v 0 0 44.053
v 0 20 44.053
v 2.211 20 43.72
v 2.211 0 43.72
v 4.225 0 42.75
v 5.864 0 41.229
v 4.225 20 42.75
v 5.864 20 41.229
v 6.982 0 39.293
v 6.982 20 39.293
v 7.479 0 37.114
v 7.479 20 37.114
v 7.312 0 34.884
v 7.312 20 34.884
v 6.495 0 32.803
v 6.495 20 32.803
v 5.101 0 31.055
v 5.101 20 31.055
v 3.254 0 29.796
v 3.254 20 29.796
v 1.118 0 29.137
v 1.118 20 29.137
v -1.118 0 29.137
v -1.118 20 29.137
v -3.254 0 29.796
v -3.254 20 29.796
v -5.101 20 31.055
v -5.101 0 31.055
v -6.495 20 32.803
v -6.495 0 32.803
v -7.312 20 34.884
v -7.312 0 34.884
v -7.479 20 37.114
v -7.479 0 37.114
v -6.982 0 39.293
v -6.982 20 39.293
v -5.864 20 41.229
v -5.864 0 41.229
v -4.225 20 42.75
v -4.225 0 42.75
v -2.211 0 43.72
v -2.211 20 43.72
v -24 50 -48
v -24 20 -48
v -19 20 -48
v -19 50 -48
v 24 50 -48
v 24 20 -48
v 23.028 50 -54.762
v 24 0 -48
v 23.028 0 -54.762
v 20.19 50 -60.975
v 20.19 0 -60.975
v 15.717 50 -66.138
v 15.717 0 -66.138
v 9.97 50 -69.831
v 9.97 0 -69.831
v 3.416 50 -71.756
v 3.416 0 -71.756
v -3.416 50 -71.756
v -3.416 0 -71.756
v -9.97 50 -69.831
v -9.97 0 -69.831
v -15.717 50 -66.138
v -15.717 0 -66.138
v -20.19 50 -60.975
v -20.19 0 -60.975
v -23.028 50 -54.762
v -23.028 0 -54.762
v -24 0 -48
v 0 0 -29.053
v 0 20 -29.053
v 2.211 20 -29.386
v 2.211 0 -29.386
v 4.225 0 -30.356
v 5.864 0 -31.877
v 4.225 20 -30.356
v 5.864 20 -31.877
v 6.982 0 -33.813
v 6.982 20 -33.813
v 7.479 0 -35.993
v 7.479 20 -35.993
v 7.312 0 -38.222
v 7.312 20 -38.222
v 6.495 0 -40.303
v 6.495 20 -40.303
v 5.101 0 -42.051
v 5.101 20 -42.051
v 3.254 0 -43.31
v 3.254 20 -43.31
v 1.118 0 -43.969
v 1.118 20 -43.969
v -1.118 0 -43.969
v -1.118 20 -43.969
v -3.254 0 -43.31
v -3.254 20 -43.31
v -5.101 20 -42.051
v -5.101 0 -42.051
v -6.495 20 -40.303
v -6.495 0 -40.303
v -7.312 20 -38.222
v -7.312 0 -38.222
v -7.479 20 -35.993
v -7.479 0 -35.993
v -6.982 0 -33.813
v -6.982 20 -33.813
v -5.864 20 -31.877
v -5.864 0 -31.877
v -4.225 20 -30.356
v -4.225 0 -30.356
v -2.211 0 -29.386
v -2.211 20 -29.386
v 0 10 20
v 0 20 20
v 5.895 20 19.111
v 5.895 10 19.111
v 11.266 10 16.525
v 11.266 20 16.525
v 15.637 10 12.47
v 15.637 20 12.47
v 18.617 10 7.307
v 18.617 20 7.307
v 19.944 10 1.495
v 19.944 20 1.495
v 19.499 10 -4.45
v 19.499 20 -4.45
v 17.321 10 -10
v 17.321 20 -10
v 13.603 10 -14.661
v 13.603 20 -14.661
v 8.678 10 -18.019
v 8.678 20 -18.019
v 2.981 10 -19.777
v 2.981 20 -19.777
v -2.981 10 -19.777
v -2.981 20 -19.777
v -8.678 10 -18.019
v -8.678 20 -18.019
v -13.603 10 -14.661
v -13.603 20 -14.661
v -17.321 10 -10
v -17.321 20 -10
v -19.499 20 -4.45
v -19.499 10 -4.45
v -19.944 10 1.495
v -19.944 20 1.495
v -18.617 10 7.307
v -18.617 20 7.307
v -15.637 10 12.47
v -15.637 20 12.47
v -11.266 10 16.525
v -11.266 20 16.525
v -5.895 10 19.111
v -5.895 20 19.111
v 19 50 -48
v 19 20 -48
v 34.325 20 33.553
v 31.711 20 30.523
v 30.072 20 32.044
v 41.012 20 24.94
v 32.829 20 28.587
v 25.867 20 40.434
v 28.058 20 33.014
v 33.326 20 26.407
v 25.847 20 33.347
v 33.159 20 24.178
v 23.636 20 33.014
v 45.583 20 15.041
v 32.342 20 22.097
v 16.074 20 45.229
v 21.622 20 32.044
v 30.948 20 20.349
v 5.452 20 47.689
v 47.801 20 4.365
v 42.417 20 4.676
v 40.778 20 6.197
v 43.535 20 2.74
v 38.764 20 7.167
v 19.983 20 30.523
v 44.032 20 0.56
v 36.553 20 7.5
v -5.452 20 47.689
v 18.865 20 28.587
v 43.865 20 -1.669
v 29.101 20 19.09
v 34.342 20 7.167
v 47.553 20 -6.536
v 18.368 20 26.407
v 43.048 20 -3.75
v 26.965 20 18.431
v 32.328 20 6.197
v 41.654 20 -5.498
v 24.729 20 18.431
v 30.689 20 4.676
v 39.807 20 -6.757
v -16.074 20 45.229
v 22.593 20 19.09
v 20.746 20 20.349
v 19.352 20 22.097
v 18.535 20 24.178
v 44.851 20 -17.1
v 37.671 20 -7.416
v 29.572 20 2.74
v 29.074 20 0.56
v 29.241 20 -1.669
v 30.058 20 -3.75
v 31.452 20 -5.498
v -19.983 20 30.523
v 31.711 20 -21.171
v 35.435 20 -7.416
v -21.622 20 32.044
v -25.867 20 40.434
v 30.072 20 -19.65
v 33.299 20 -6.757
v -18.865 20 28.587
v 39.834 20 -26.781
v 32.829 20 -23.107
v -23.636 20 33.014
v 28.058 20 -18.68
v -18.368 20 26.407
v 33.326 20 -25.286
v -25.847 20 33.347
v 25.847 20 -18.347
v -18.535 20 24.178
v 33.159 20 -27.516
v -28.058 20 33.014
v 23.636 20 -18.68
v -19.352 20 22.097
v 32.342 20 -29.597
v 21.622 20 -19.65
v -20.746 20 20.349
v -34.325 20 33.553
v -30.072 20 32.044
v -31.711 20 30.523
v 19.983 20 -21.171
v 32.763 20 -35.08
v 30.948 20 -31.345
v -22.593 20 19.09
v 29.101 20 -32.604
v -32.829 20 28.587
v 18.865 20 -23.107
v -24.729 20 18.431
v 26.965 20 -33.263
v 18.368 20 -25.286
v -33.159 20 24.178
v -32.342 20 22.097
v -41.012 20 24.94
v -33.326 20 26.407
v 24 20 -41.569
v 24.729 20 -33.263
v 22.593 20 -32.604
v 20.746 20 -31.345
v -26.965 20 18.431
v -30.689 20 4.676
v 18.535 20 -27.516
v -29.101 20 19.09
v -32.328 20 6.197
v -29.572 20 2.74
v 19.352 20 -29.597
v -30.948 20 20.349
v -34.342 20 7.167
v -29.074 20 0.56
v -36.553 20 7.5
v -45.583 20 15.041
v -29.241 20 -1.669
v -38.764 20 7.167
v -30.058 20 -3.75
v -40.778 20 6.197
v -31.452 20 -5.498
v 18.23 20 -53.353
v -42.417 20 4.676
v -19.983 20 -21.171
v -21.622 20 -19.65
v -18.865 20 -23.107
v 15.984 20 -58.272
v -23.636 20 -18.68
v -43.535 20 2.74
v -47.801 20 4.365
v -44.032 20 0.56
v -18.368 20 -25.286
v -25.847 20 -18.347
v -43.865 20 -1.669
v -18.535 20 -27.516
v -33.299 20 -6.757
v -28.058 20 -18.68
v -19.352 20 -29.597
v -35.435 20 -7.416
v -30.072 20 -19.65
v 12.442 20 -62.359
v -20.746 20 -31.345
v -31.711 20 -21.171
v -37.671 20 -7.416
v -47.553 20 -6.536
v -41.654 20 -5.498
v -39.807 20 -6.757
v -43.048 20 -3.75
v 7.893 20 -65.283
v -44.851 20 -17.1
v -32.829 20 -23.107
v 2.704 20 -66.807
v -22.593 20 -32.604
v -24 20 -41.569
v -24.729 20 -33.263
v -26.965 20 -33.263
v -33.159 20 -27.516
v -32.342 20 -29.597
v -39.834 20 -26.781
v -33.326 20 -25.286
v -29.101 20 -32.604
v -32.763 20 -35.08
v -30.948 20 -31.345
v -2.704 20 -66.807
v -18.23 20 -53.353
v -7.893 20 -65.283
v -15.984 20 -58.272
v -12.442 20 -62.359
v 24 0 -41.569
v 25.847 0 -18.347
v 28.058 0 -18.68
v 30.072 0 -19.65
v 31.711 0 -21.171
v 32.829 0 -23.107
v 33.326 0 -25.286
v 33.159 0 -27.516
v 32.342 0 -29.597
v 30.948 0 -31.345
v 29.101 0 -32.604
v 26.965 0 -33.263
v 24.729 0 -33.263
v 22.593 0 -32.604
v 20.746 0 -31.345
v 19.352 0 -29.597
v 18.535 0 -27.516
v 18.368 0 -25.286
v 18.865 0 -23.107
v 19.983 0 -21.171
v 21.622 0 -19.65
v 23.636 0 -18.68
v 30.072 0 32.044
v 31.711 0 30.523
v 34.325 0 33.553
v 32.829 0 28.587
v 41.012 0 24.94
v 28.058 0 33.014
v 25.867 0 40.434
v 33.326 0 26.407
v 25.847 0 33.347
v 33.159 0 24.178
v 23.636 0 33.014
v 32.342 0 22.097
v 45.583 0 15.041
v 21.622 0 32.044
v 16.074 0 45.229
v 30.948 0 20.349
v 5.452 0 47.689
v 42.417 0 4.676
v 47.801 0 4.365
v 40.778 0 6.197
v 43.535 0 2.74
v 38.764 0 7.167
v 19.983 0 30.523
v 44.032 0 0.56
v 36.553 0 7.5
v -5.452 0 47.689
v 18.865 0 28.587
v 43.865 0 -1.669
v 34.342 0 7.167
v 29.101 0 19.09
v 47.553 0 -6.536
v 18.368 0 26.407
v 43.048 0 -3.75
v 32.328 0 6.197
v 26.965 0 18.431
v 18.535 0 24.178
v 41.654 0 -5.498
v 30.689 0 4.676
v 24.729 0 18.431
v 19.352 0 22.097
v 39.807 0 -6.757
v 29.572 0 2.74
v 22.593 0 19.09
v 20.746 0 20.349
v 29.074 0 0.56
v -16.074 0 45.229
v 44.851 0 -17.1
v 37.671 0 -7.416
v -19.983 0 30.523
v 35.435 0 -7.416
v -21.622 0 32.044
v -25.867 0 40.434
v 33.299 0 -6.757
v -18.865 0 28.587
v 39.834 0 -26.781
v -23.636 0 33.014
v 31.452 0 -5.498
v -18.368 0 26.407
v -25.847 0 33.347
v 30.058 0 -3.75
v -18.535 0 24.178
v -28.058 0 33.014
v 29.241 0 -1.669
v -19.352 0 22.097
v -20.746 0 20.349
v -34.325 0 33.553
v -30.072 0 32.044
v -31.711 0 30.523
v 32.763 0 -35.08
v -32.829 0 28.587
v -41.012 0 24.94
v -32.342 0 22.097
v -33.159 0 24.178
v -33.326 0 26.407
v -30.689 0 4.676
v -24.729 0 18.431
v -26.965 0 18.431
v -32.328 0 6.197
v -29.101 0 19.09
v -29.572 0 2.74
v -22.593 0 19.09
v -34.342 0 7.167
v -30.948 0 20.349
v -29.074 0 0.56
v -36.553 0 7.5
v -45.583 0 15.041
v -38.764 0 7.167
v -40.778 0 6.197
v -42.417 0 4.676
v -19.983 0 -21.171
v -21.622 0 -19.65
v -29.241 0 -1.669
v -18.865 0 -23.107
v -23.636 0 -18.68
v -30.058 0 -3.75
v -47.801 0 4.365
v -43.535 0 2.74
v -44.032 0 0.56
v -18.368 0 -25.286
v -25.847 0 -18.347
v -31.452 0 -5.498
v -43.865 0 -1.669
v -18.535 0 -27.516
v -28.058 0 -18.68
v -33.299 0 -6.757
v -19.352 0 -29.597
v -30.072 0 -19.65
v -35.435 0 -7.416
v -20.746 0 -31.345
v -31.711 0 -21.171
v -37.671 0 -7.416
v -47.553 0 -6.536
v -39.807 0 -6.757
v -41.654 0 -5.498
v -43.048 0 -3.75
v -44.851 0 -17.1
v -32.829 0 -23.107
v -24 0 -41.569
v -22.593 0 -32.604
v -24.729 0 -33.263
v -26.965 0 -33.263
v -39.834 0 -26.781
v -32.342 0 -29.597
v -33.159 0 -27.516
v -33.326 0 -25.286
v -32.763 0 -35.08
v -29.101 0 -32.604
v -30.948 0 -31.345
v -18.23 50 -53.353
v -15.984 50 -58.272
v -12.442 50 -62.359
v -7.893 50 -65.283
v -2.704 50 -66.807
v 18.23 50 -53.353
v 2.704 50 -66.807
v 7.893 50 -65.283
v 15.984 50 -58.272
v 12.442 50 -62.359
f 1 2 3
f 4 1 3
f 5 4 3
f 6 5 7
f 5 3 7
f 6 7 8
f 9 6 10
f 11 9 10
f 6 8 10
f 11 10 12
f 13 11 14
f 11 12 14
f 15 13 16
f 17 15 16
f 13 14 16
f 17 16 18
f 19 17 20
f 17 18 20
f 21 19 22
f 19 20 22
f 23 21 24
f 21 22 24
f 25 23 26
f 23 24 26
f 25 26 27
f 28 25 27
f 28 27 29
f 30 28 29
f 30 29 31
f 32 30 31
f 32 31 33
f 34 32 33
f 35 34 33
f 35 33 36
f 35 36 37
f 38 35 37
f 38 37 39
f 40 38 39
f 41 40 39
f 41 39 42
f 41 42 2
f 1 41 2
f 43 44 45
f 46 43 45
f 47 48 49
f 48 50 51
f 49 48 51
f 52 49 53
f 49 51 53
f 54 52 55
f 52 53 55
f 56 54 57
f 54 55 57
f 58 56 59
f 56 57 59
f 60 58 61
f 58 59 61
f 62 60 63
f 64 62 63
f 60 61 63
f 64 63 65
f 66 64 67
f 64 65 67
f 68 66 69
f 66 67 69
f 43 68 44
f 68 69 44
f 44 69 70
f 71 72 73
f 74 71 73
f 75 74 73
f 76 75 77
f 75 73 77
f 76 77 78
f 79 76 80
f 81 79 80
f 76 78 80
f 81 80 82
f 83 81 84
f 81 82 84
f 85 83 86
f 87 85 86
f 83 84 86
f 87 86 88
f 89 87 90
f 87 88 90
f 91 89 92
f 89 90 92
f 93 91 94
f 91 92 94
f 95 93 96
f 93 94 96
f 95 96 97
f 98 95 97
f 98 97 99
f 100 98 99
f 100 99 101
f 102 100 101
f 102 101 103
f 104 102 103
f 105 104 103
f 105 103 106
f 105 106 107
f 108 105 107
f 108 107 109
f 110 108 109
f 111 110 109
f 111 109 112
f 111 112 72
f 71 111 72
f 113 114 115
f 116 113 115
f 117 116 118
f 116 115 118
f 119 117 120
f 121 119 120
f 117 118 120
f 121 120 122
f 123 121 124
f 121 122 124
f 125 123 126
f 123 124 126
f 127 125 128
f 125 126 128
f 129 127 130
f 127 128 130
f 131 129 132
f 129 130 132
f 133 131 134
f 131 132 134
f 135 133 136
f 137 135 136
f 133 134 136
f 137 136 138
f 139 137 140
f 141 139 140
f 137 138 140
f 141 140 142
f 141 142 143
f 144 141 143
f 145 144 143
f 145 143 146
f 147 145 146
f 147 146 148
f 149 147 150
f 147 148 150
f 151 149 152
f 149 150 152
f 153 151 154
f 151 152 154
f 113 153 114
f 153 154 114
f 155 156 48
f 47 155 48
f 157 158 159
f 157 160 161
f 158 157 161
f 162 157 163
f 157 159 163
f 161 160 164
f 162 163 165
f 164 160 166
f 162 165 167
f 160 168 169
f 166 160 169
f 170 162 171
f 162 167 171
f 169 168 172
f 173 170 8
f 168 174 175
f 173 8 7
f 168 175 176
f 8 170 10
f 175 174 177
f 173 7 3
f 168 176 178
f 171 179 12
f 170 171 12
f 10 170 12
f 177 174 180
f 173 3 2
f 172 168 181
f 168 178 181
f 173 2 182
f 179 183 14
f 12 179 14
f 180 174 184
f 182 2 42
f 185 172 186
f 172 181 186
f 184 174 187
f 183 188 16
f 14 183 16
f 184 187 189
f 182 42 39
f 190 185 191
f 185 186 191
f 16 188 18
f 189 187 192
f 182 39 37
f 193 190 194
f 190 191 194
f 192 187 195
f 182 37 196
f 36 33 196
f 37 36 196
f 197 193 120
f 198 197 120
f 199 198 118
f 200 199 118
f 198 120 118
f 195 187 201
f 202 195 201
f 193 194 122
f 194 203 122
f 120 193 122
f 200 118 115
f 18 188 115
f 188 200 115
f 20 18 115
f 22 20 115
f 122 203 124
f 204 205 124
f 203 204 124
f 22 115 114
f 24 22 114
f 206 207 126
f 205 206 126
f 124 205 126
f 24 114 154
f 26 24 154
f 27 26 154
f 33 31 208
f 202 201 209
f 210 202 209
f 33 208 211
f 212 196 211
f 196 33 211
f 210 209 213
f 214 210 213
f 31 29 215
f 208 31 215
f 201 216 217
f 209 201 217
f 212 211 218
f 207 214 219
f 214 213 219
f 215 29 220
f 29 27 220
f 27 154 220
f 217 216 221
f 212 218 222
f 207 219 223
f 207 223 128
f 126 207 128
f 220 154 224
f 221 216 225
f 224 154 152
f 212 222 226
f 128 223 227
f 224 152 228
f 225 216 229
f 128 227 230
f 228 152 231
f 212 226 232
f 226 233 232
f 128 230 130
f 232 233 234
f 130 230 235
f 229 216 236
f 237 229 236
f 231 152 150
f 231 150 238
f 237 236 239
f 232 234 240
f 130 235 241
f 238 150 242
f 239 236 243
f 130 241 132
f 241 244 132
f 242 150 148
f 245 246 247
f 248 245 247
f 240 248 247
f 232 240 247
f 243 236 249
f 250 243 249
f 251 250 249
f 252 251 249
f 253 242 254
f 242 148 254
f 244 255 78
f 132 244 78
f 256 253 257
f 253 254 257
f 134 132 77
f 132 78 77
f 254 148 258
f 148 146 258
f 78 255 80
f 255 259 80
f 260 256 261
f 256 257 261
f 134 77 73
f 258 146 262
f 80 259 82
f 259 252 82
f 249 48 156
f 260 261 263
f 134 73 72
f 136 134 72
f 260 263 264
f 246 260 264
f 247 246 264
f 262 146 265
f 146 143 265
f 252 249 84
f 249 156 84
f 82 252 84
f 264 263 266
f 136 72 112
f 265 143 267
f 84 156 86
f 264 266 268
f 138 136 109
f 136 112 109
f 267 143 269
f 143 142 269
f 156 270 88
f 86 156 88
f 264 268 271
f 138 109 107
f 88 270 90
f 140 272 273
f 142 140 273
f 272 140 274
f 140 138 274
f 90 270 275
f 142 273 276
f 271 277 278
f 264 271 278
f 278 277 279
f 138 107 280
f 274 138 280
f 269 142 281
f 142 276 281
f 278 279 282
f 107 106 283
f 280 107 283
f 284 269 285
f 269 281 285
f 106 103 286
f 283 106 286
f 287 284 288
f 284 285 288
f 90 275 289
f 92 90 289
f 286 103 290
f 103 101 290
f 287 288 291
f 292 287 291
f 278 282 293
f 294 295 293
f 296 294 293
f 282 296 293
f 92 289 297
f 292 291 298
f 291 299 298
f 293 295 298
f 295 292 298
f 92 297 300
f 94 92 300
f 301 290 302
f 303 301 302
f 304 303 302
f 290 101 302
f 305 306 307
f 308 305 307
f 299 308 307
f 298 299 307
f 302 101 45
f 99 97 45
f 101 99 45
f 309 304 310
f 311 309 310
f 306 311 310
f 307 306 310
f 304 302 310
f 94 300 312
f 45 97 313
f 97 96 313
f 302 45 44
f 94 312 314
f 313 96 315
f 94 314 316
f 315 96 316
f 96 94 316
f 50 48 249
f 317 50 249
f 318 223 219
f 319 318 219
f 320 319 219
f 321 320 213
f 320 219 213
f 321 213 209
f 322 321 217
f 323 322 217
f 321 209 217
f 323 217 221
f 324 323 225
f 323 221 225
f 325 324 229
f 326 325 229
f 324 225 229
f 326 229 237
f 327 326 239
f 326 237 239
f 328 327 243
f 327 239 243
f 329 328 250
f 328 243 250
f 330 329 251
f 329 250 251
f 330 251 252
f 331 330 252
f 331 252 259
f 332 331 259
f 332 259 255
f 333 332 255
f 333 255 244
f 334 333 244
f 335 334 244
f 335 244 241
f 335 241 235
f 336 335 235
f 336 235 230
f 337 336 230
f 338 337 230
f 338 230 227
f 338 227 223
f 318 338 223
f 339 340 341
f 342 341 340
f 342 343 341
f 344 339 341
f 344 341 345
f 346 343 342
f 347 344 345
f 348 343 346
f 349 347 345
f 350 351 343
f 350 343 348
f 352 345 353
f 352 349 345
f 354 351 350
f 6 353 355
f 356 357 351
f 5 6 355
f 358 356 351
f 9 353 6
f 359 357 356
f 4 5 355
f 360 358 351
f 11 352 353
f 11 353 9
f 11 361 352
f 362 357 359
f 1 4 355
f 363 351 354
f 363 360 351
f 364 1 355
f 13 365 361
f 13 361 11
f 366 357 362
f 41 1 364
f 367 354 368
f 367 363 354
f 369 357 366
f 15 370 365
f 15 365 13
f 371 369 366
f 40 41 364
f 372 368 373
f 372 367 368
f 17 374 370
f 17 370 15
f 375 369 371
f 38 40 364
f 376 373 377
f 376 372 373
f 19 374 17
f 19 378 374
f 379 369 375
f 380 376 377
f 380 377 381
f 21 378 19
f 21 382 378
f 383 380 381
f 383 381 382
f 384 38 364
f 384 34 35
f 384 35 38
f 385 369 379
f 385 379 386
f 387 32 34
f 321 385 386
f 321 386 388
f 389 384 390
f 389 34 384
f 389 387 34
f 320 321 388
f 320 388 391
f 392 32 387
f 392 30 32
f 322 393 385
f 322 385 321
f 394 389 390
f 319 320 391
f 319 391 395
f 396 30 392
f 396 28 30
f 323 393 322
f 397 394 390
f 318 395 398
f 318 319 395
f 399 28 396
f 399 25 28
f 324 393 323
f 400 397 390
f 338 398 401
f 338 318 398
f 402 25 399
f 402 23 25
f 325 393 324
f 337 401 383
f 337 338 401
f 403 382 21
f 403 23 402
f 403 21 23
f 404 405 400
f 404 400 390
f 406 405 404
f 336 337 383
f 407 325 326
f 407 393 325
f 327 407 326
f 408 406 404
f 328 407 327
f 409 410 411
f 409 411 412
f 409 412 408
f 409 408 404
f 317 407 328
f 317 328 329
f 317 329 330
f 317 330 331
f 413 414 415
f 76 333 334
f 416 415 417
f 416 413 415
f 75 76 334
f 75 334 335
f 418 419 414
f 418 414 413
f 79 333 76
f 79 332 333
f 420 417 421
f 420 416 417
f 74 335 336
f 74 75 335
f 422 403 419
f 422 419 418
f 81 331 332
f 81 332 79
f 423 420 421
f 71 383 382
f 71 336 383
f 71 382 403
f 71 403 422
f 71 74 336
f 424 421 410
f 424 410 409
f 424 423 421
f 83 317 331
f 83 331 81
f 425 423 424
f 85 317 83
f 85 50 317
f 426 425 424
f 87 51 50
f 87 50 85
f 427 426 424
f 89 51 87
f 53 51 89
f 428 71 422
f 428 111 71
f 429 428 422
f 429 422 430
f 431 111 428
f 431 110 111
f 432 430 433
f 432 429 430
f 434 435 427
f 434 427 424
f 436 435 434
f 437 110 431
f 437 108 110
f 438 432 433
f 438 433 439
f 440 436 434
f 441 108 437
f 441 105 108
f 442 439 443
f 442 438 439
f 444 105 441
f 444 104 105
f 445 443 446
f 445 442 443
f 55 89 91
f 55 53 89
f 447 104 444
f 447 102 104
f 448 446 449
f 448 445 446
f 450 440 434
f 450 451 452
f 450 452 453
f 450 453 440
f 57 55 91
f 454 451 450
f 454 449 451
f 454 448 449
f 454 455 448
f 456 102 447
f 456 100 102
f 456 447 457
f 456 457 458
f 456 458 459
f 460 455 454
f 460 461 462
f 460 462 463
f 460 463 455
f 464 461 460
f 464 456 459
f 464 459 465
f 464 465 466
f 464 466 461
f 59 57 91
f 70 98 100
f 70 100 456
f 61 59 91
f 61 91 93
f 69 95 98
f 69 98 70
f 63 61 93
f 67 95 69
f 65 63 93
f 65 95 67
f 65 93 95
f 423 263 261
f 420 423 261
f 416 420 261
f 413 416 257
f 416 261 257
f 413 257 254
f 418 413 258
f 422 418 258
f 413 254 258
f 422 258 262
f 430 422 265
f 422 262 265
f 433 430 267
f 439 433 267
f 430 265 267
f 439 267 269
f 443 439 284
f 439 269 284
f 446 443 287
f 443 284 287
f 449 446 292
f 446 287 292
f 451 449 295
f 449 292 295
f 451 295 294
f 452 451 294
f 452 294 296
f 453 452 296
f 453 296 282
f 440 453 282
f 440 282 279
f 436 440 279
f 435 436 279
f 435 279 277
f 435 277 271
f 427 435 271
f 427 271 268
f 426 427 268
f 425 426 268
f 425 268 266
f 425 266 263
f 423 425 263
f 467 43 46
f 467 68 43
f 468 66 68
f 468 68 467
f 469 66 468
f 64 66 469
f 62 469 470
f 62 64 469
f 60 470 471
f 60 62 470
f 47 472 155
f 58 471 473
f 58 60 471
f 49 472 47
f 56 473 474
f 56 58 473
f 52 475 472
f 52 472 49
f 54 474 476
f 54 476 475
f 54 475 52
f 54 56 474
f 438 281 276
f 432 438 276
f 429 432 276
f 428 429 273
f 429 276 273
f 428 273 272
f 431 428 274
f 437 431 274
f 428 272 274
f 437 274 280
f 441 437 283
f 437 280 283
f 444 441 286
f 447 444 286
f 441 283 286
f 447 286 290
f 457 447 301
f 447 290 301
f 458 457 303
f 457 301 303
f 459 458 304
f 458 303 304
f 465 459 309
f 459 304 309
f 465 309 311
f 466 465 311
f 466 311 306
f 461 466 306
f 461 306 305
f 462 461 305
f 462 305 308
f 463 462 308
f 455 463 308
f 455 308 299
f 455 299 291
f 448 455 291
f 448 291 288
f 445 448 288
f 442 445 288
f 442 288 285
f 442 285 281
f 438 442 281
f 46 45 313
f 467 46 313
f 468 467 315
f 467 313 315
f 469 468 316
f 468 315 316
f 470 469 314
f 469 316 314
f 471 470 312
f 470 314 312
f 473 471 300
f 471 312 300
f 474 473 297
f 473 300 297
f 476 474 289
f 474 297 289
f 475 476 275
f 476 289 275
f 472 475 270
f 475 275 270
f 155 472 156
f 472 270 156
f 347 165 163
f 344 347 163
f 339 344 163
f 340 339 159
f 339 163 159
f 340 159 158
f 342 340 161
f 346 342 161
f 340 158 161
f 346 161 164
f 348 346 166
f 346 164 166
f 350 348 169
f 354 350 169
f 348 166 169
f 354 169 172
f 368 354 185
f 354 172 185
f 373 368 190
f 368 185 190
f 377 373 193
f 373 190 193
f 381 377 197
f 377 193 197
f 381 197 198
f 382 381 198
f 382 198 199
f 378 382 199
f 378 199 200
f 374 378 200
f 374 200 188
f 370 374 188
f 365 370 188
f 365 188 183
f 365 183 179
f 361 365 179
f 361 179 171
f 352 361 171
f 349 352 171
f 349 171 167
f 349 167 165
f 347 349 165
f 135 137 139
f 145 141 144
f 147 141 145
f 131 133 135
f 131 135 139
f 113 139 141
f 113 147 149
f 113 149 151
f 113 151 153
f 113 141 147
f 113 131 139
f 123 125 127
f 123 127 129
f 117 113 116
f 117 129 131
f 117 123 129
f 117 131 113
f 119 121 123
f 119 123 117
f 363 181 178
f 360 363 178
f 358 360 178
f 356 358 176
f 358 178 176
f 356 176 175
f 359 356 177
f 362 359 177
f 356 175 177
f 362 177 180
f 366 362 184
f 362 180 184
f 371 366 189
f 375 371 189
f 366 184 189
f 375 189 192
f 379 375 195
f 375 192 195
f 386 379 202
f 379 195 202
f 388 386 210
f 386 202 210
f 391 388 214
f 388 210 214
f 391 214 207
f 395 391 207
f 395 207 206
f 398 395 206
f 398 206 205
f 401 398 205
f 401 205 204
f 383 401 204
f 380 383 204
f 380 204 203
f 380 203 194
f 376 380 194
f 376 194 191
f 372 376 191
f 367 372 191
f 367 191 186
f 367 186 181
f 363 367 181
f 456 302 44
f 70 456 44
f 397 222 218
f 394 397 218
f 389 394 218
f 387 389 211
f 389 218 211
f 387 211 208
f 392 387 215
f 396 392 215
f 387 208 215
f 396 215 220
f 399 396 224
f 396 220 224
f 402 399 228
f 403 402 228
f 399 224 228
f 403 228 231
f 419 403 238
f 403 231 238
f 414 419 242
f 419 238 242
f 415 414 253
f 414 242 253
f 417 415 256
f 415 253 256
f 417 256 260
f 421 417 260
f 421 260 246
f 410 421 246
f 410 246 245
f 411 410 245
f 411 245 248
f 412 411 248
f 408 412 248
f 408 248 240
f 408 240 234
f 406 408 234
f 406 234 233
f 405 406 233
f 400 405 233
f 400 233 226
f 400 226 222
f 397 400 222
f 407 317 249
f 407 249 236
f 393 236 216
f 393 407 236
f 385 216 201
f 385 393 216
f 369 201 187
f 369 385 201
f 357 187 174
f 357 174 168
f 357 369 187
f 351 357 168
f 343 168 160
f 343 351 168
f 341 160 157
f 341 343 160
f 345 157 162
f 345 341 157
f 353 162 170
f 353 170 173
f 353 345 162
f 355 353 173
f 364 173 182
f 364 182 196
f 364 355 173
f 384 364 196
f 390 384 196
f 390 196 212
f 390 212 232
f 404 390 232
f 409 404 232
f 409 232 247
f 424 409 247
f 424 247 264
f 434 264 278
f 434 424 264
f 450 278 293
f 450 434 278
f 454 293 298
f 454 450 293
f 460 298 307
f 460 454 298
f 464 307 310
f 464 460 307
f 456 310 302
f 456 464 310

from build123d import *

# Parameters (mm, degrees)
EXTRUDE_1_DEPTH     = 20
SKETCH_2_R          = 20
CUT_EXTRUDE_1_DEPTH = 10
SKETCH_3_R          = 7.5
CUT_EXTRUDE_2_DEPTH = 89.814413245
EXTRUDE_2_DEPTH     = 30


with BuildPart() as part:
    # 草圖1 → 填料-伸長1 (new body)
    with BuildSketch(Plane(origin=(0, 0, 0), x_dir=(1, 0, 0), z_dir=(0, 1, 0))):
        with BuildLine():
            Line((-24, 41.569219382), (-24, 48))
            ThreePointArc((-24, 48), (0, 72), (24, 48))
            Line((24, 48), (24, 41.569219382))
            ThreePointArc((24, 41.569219382), (0, -48), (-24, 41.569219382))
        make_face()
    extrude(amount=EXTRUDE_1_DEPTH)

    # 草圖2 → 除料-伸長1 (cut)
    with BuildSketch(Plane(origin=(0, 20, 0), x_dir=(1, 0, 0), z_dir=(0, 1, 0))):
        with Locations(Location((0, 0, 0), (0, 0, 270))):
            Circle(SKETCH_2_R)
    extrude(amount=-CUT_EXTRUDE_1_DEPTH, mode=Mode.SUBTRACT)

    # 草圖3 → 除料-伸長2 (cut, through all)
    with BuildSketch(Plane(origin=(0, 20, 0), x_dir=(1, 0, 0), z_dir=(0, 1, 0))):
        with Locations(Location((0, 36.553135894, 0), (0, 0, 270))):
            Circle(SKETCH_3_R)
        with Locations(Location((25.846970264, 25.846970264, 0), (0, 0, 270))):
            Circle(SKETCH_3_R)
        with Locations(Location((36.553135894, 0, 0), (0, 0, 270))):
            Circle(SKETCH_3_R)
        with Locations(Location((25.846970264, -25.846970264, 0), (0, 0, 270))):
            Circle(SKETCH_3_R)
        with Locations(Location((0, -36.553135894, 0), (0, 0, 270))):
            Circle(SKETCH_3_R)
        with Locations(Location((-25.846970264, -25.846970264, 0), (0, 0, 270))):
            Circle(SKETCH_3_R)
        with Locations(Location((-36.553135894, 0, 0), (0, 0, 270))):
            Circle(SKETCH_3_R)
        with Locations(Location((-25.846970264, 25.846970264, 0), (0, 0, 270))):
            Circle(SKETCH_3_R)
    extrude(amount=-CUT_EXTRUDE_2_DEPTH, mode=Mode.SUBTRACT)

    # 草圖4 → 填料-伸長2 (add)
    with BuildSketch(Plane(origin=(0, 20, 0), x_dir=(1, 0, 0), z_dir=(0, 1, 0))):
        with BuildLine():
            Line((-24, 48), (-19, 48))
            ThreePointArc((-19, 48), (0, 67), (19, 48))
            Line((19, 48), (24, 48))
            ThreePointArc((24, 48), (0, 72), (-24, 48))
        make_face()
    extrude(amount=EXTRUDE_2_DEPTH)


solid = part.part
